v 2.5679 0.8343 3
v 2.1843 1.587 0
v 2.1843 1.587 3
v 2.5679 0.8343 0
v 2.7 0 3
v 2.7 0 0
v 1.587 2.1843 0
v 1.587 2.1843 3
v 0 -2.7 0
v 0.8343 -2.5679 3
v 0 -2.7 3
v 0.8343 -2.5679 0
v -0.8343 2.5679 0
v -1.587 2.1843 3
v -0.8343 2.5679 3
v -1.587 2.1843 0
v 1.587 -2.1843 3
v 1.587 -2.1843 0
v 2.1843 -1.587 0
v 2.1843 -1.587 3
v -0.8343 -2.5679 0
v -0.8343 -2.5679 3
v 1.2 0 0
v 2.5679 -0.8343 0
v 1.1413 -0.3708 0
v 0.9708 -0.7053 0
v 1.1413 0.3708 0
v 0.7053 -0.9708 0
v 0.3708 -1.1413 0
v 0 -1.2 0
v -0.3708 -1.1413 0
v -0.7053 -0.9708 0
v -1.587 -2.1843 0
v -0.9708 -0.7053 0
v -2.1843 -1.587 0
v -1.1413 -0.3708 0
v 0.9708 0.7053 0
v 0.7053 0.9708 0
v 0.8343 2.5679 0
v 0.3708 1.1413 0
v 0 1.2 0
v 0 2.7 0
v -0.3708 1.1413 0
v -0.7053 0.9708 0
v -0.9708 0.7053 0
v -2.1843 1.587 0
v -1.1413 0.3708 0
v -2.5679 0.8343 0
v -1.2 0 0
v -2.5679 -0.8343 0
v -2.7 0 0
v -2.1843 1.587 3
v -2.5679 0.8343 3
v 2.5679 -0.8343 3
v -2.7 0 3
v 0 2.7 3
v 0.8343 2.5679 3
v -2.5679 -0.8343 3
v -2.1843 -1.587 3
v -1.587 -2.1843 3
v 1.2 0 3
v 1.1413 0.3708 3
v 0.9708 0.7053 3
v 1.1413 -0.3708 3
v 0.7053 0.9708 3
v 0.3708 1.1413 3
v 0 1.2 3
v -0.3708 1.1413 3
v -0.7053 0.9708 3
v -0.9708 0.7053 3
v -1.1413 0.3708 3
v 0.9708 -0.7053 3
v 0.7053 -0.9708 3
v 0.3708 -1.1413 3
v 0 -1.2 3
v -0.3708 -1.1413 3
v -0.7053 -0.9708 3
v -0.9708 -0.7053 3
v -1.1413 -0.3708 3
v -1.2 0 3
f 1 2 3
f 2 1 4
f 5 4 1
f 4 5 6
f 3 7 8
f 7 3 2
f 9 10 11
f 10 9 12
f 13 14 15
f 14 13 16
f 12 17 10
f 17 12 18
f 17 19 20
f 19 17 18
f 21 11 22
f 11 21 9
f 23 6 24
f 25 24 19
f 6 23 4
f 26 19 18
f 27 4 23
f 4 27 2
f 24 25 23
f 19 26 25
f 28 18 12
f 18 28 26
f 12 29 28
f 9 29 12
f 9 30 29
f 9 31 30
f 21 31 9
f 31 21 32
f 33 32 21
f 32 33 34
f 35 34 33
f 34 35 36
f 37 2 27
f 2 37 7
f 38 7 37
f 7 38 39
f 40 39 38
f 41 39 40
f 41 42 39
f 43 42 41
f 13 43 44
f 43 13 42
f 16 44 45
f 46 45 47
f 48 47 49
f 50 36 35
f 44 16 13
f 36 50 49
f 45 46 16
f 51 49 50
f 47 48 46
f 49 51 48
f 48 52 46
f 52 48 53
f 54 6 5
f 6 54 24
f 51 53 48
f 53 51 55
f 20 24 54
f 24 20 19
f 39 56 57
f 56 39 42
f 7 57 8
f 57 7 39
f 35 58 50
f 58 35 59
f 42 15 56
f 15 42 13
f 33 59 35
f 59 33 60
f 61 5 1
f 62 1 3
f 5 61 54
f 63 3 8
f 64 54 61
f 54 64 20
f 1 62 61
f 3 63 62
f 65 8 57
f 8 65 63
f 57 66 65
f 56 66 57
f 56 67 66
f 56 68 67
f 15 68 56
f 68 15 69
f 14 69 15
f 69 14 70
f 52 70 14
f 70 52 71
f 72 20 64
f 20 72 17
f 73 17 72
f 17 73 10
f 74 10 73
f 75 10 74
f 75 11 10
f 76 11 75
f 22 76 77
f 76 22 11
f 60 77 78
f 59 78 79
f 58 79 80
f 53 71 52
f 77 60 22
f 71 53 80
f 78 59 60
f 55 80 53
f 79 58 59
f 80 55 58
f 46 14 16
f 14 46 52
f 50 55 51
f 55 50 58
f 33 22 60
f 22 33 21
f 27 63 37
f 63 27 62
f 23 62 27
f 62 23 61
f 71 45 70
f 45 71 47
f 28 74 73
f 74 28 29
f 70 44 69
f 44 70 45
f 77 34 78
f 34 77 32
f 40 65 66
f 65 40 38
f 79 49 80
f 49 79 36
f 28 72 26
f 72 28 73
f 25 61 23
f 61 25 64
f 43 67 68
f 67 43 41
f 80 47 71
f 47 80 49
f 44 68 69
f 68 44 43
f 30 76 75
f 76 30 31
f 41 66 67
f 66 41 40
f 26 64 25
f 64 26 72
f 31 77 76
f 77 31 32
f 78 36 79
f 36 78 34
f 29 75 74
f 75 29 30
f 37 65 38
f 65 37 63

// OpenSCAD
// file: ../Cylinder.scad
// Author    KMS - Martin Dubois, P.Eng.
// Copyright (C) 2021 KMS
// Product   Base3D
// File      Cylinder.scad

// Public
/////////////////////////////////////////////////////////////////////////////

module Cylinder_X( aLength, aRadius, aFN )
{
    rotate( [ 0, 90, 0 ] )
        cylinder( aLength, aRadius, aRadius, $fn=aFN );
}

module Cylinder_Y( aLength, aRadius, aFN )
{
    rotate( [ - 90, 0, 0 ] )
        cylinder( aLength, aRadius, aRadius, $fn=aFN );
}

module Cylinder_Z( aLength, aRadius, aFN )
{
    cylinder( aLength, aRadius, aRadius, $fn=aFN );
}
// main file
// Author   KMS - Martin Dubois, ing.
// Product  Base3D
// File     Metric/M3.scad

use <../Cylinder.scad>

M2_Spacer(3);

// Private constants
/////////////////////////////////////////////////////////////////////////////

M2_FN             = 20  ;
M2_Insert_Radius0 =  1.4;
M2_Insert_Radius1 =  1.5;
M2_Ov             =  0.1;

// Public modules
/////////////////////////////////////////////////////////////////////////////

module M2_Head_Y( aLength ) { Cylinder_Y( aLength, HEAD_R, 30 ); }
module M2_Head_Z( aLength ) { Cylinder_Z( aLength, HEAD_R, 30 ); }

module M2_Insert_X() { rotate( [ 0, 90, 0 ] ) cylinder( INSERT_LENGTH + EPS, INSERT_R1, INSERT_R0, $fn = M2_FN ); }

module M2_Insert_ZR() { cylinder( INSERT_LENGTH + EPS, INSERT_R1, INSERT_R0, $fn = M2_FN ); }

module M2_Hex_ZR() { cylinder( INSERT_LENGTH + EPS, HEX_R1, HEX_R0, $fn = 6 ); }

// aZ0  Height of the screw hole
module M2_Insert( aZ0 )
{
    // Insert
    translate( [ 0, 0, aZ0 ] )
        cylinder( M2_Insert_Height + M2_Ov, M2_Insert_Radius0, M2_Insert_Radius1, $fn = M2_FN );

    // Screw
    translate( [ 0, 0, - M2_Ov ] )
        cylinder( aZ0 + 2 * M2_Ov, M2_Radius, M2_Radius, $fn = M2_FN );
}

// aZ0  Height of the screw hole
// aZ1  Height of the mount hole
module M2_InsertAndMountHole0( aZ0, aZ1 )
{
    translate( [ 0, 0, aZ0 + M2_Insert_Height ] )
        cylinder( aZ1 + M2_Ov, M2_Insert_Radius2, M2_Insert_Radius2, $fn = M2_FN );

    M2_Insert( aZ0 );
}

// aZ0  Height of the screw hole
// aZ1  Height of the mount hole
module M2_InsertAndMountHole1( aZ0, aZ1 )
{
    translate( [ 0, 0, aZ0 + M2_Insert_Height ] )
        cylinder( aZ1 + M2_Ov, M2_Washer_Radius, M2_Washer_Radius, $fn = M2_FN );

    M2_Insert( aZ0 );
}

module M2_Shank_X( aLength ) { Cylinder_X( aLength, SHANK_R, 30 ); }
module M2_Shank_Y( aLength ) { Cylinder_Y( aLength, SHANK_R, 30 ); }
module M2_Shank_Z( aLength ) { Cylinder_Z( aLength, SHANK_R, 30 ); }

module M2_Spacer( aLength )
{
    difference()
    {
        cylinder( aLength, SHANK_R + 1.5, SHANK_R + 1.5, $fn = M2_FN );

        translate( [ 0, 0, - EPS ] )
            cylinder( 2 * EPS + aLength, SHANK_R, SHANK_R, $fn = M2_FN );
    }
}

module M2_Thread_X( aLength ) { Cylinder_X( aLength, THREAD_R, 8 ); }
module M2_Thread_Y( aLength ) { Cylinder_Y( aLength, THREAD_R, 8 ); }
module M2_Thread_Z( aLength ) { Cylinder_Z( aLength, THREAD_R, 8 ); }

// Private
/////////////////////////////////////////////////////////////////////////////

EPS = 0.1;

HEAD_R = 2.1;

HEX_R0 = 2.2;
HEX_R1 = 2.3;

INSERT_LENGTH = 3;
INSERT_R0     = 1.4;
INSERT_R1     = 1.5;

SHANK_R = 1.2;

THREAD_R = 1;
